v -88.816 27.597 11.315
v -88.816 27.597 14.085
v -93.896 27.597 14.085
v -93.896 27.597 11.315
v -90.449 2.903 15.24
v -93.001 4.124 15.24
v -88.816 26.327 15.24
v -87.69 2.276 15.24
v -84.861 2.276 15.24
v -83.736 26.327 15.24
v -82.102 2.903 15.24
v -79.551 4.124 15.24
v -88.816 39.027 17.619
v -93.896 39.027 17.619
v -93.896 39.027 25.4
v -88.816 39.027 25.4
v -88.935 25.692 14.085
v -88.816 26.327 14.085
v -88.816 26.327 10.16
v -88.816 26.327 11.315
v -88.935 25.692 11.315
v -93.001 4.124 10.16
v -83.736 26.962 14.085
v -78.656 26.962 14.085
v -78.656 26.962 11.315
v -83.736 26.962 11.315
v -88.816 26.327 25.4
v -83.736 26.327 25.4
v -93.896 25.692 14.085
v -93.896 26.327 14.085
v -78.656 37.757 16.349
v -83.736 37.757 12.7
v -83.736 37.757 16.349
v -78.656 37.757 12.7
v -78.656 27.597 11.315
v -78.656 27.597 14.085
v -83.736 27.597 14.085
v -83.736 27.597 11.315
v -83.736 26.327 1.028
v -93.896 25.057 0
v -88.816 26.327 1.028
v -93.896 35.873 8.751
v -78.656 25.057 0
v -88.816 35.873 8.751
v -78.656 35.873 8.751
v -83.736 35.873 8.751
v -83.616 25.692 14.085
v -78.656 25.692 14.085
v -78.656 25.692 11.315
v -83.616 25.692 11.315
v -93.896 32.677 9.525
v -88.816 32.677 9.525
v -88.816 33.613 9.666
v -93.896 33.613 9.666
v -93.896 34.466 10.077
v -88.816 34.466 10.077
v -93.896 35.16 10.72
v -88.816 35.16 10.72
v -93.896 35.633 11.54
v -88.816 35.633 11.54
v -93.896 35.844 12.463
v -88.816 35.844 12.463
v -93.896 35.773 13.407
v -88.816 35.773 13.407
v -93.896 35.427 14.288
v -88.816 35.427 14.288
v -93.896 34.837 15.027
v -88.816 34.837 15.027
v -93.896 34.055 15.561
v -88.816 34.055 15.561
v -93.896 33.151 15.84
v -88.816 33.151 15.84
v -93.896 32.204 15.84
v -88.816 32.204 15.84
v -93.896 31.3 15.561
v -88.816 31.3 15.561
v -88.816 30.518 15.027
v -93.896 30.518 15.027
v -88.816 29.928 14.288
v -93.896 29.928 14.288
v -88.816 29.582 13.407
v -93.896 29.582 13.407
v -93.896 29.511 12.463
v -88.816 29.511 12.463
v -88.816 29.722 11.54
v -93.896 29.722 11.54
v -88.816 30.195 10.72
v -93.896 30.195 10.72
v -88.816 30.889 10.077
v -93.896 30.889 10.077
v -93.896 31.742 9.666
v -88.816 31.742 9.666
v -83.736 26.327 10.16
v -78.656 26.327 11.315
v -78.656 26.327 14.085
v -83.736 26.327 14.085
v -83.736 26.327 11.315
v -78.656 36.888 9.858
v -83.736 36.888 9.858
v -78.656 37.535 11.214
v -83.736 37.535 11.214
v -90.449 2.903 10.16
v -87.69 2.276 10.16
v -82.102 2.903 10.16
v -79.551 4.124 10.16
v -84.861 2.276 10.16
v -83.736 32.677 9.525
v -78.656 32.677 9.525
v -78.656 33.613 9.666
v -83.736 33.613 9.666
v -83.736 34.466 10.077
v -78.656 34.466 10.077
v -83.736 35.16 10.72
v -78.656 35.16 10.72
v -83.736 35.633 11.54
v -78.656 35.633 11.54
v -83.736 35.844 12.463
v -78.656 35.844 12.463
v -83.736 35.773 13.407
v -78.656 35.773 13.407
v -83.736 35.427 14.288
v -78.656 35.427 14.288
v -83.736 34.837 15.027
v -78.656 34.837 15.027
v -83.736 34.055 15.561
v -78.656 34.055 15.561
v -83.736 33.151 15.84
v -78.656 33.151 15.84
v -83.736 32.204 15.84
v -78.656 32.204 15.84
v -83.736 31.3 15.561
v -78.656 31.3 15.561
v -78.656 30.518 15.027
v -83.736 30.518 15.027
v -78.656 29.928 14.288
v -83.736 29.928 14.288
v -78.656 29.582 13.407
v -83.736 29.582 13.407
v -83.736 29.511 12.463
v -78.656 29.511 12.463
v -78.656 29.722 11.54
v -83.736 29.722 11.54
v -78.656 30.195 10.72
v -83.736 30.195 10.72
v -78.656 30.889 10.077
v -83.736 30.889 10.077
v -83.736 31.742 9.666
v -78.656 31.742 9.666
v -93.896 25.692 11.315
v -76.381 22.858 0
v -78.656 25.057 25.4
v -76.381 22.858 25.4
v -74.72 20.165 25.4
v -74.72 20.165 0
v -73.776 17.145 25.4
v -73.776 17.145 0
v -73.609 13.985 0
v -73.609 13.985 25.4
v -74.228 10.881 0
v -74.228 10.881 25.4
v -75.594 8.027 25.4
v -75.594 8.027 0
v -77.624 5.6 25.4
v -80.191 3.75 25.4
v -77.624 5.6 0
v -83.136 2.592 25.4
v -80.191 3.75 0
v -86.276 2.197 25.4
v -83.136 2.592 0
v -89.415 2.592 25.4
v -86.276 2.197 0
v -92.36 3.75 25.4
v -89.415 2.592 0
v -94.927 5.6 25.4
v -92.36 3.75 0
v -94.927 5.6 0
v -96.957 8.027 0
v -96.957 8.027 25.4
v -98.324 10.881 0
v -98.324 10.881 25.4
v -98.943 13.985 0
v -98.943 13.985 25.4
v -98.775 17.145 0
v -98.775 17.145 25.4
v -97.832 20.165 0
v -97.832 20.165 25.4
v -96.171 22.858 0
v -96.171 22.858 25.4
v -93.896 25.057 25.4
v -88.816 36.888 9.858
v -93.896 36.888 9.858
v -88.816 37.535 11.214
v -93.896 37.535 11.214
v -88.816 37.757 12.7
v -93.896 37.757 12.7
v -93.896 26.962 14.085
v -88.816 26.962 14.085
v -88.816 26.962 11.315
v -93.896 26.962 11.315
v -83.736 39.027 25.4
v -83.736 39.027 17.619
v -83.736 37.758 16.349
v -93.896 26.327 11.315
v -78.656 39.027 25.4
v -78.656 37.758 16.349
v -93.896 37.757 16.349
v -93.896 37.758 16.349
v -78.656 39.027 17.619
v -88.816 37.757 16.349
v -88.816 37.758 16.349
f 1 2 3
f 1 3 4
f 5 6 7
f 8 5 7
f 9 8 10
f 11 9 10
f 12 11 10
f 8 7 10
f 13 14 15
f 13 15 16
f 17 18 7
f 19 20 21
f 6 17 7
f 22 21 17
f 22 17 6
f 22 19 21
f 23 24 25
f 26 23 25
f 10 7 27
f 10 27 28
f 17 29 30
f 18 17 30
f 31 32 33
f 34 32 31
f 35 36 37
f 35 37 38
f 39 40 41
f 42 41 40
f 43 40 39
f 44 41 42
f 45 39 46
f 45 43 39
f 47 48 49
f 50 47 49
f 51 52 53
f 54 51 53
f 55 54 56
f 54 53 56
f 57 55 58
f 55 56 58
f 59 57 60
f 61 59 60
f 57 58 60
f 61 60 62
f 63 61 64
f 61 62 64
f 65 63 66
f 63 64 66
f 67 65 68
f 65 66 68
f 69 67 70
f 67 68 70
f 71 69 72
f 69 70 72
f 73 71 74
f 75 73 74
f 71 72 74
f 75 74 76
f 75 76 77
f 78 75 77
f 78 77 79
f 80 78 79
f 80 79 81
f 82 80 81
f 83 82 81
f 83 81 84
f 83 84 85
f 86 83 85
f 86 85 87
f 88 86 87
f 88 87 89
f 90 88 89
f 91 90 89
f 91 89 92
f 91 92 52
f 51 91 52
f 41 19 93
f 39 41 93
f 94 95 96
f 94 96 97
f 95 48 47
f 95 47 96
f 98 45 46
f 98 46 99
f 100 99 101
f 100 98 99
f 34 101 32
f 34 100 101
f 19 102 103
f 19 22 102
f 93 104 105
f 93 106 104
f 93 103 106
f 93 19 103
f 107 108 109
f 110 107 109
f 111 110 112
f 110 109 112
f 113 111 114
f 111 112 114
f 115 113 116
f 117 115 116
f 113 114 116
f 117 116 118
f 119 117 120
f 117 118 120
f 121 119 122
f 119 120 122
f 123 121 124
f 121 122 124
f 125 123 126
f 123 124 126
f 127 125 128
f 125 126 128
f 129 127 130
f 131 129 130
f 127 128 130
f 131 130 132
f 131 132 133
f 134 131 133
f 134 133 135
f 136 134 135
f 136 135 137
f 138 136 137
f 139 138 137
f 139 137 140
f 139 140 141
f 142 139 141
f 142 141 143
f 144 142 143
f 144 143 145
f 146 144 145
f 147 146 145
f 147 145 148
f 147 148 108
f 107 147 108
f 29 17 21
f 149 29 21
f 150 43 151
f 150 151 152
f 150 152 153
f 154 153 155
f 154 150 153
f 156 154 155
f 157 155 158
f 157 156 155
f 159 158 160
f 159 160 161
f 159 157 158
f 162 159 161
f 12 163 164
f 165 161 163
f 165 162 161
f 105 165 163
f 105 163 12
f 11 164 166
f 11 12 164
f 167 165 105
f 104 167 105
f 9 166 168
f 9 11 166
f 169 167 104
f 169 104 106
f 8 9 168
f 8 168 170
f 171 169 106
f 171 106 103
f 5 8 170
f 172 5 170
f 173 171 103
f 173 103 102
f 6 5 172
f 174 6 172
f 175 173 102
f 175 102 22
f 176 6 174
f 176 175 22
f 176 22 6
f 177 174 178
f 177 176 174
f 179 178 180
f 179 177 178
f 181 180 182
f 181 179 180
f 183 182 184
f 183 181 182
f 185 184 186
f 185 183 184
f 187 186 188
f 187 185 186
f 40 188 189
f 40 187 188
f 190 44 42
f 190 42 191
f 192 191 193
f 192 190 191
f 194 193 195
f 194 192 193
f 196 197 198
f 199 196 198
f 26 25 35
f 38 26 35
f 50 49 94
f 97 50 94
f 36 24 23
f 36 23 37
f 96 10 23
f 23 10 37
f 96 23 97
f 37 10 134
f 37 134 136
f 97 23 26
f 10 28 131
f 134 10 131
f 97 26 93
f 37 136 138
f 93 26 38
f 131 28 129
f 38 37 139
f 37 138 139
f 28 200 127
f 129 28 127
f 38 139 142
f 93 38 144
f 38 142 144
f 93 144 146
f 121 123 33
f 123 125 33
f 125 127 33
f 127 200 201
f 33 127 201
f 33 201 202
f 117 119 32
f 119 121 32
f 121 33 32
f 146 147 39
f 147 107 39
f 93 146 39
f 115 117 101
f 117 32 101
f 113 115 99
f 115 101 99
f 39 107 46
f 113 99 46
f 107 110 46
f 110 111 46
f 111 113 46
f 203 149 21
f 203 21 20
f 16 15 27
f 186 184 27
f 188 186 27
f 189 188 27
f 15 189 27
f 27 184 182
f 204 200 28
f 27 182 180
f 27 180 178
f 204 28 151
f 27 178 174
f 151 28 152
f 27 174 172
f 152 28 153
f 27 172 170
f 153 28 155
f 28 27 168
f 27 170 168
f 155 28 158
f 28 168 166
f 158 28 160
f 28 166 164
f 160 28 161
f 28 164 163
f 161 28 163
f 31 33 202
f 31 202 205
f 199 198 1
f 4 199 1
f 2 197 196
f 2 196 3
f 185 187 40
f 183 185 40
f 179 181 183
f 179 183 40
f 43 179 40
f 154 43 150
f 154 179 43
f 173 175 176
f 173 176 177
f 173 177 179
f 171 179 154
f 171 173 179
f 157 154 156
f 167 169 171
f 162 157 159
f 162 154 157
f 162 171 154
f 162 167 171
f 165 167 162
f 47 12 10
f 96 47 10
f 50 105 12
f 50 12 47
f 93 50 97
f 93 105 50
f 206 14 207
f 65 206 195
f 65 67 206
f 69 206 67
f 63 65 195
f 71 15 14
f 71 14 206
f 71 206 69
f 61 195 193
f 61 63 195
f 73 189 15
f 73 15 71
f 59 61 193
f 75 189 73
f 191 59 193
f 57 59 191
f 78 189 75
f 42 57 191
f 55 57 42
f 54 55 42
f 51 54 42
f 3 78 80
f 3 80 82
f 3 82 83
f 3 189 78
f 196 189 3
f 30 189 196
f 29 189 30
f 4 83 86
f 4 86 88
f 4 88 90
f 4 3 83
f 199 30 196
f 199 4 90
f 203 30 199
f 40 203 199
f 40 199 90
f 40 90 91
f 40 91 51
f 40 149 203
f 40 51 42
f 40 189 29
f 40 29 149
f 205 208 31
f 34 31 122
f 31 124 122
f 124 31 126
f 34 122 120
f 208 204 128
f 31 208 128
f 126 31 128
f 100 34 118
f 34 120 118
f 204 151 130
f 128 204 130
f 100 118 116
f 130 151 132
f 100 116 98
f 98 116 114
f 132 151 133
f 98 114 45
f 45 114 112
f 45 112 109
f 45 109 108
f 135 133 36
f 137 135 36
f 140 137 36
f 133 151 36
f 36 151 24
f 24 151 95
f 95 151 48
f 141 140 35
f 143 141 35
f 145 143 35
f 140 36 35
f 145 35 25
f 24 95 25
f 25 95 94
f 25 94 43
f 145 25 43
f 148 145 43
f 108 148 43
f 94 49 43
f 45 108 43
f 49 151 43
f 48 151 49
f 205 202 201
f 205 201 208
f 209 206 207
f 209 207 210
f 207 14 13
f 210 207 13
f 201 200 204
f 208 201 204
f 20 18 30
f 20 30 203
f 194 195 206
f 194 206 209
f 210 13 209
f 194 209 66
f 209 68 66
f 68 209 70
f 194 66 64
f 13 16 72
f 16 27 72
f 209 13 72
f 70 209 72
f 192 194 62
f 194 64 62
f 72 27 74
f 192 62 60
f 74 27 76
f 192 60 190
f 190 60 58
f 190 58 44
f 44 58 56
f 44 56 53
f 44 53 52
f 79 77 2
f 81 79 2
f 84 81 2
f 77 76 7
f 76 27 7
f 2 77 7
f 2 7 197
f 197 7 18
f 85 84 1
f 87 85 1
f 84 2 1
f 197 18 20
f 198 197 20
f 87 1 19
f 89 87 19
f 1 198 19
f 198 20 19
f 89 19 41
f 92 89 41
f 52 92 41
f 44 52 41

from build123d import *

# Parameters (mm, degrees)
BOSS_EXTRUDE2_DEPTH     = 25.4
SKETCH5_W               = 15.24
SKETCH5_H               = 25.4
BOSS_EXTRUDE3_DEPTH     = 12.7
SKETCH7_W               = 5.08
SKETCH7_H               = 25.4
CUT_EXTRUDE1_DEPTH      = 11.43
SKETCH8_R               = 3.175
CUT_EXTRUDE2_DEPTH      = 17.018
SKETCH9_R               = 2.54
CUT_EXTRUDE3_DEPTH      = 105.993449126
SKETCH10_W              = 5.08
SKETCH10_H              = 9.050505722
BOSS_EXTRUDE4_DEPTH     = 1.27
CHAMFER1_SIZE           = 1.27
CUT_EXTRUDE4_DEPTH      = 2.54
CUT_EXTRUDE4_DEPTH_BACK = 2.54
SKETCH12_W              = 2.770836572
SKETCH12_H              = 0.635
CUT_EXTRUDE5_DEPTH      = 51.805574613


with BuildPart() as part:
    # Sketch1 → Boss-Extrude2 (new body)
    with BuildSketch(Plane.XY):
        with BuildLine():
            Line((-93.89579229, 25.057477651), (-78.65579229, 25.057477651))
            ThreePointArc((-78.65579229, 25.057477651), (-86.27579229, 2.197477651), (-93.89579229, 25.057477651))
        make_face()
    extrude(amount=BOSS_EXTRUDE2_DEPTH)

    # Sketch5 → Boss-Extrude3 (add)
    with BuildSketch(Plane(origin=(0, 25.057477651, 0), x_dir=(1, 0, 0), z_dir=(0, 1, 0))):
        with Locations((-86.27579229, -12.7)):
            Rectangle(SKETCH5_W, SKETCH5_H)
    extrude(amount=BOSS_EXTRUDE3_DEPTH)

    # Sketch7 → Cut-Extrude1 (cut)
    with BuildSketch(Plane(origin=(0, 37.757477651, 0), x_dir=(1, 0, 0), z_dir=(0, 1, 0))):
        with Locations((-86.27579229, -12.7)):
            Rectangle(SKETCH7_W, SKETCH7_H)
    extrude(amount=-CUT_EXTRUDE1_DEPTH, mode=Mode.SUBTRACT)

    # Sketch8 → Cut-Extrude2 (cut)
    with BuildSketch(Plane(origin=(-78.65579229, 0, 0), x_dir=(0, 0, -1), z_dir=(1, 0, 0))):
        with Locations((-12.7, 32.677477651)):
            Circle(SKETCH8_R)
        with BuildLine():
            Line((-12.7, 37.757477651), (0, 37.757477651))
            Line((0, 37.757477651), (0, 25.057477651))
            Line((0, 25.057477651), (-8.750796536, 35.872816757))
            ThreePointArc((-8.750796536, 35.872816757), (-10.512069775, 37.262165353), (-12.7, 37.757477651))
        make_face()
    extrude(amount=-CUT_EXTRUDE2_DEPTH, mode=Mode.SUBTRACT)

    # Sketch9 → Cut-Extrude3 (cut, through all)
    with BuildSketch(Plane(origin=(0, 26.327477651, 0), x_dir=(1, 0, 0), z_dir=(0, 1, 0))):
        with Locations(Location((-86.27579229, -12.7, 0), (0, 0, 270))):
            Circle(SKETCH9_R)
    extrude(amount=-CUT_EXTRUDE3_DEPTH, mode=Mode.SUBTRACT)

    # Sketch10 → Boss-Extrude4 (add)
    with BuildSketch(Plane(origin=(0, 37.757477651, 0), x_dir=(1, 0, 0), z_dir=(0, 1, 0))):
        with Locations((-91.35579229, -20.874747139)):
            Rectangle(SKETCH10_W, SKETCH10_H)
        with Locations((-81.19579229, -20.874747139)):
            Rectangle(SKETCH10_W, SKETCH10_H)
    extrude(amount=BOSS_EXTRUDE4_DEPTH)

    # Chamfer1
    chamfer1_edges = [part.edges().sort_by_distance(p)[0] for p in [
        (-81.19579229, 39.027477651, 16.349494278),
        (-91.35579229, 39.027477651, 16.349494278),
    ]]
    chamfer(chamfer1_edges, length=CHAMFER1_SIZE - 0.0001)  # a hair under: the kernel refuses the full size

    # Sketch11 → Cut-Extrude4 (cut, two sides: drawn at the far end of the back side and taken through both)
    with BuildSketch(Plane.XY.offset(12.7).offset(-CUT_EXTRUDE4_DEPTH_BACK)):
        with BuildLine():
            Line((-88.81579229, 26.327477651), (-93.000878218, 4.124213556))
            ThreePointArc((-93.000878218, 4.124213556), (-86.27579229, 2.197477651), (-79.550706362, 4.124213556))
            Line((-79.550706362, 4.124213556), (-83.73579229, 26.327477651))
            Line((-83.73579229, 26.327477651), (-88.81579229, 26.327477651))
        make_face()
    extrude(amount=CUT_EXTRUDE4_DEPTH + CUT_EXTRUDE4_DEPTH_BACK, mode=Mode.SUBTRACT)

    # Sketch12 → Cut-Extrude5 (cut, through all)
    with BuildSketch(Plane(origin=(-78.65579229, 0, 0), x_dir=(0, 0, -1), z_dir=(1, 0, 0))):
        with Locations((-12.7, 26.009977651)):
            Rectangle(SKETCH12_W, SKETCH12_H)
        with Locations((-12.7, 27.279977651)):
            Rectangle(SKETCH12_W, SKETCH12_H)
    extrude(amount=-CUT_EXTRUDE5_DEPTH, mode=Mode.SUBTRACT)


solid = part.part
